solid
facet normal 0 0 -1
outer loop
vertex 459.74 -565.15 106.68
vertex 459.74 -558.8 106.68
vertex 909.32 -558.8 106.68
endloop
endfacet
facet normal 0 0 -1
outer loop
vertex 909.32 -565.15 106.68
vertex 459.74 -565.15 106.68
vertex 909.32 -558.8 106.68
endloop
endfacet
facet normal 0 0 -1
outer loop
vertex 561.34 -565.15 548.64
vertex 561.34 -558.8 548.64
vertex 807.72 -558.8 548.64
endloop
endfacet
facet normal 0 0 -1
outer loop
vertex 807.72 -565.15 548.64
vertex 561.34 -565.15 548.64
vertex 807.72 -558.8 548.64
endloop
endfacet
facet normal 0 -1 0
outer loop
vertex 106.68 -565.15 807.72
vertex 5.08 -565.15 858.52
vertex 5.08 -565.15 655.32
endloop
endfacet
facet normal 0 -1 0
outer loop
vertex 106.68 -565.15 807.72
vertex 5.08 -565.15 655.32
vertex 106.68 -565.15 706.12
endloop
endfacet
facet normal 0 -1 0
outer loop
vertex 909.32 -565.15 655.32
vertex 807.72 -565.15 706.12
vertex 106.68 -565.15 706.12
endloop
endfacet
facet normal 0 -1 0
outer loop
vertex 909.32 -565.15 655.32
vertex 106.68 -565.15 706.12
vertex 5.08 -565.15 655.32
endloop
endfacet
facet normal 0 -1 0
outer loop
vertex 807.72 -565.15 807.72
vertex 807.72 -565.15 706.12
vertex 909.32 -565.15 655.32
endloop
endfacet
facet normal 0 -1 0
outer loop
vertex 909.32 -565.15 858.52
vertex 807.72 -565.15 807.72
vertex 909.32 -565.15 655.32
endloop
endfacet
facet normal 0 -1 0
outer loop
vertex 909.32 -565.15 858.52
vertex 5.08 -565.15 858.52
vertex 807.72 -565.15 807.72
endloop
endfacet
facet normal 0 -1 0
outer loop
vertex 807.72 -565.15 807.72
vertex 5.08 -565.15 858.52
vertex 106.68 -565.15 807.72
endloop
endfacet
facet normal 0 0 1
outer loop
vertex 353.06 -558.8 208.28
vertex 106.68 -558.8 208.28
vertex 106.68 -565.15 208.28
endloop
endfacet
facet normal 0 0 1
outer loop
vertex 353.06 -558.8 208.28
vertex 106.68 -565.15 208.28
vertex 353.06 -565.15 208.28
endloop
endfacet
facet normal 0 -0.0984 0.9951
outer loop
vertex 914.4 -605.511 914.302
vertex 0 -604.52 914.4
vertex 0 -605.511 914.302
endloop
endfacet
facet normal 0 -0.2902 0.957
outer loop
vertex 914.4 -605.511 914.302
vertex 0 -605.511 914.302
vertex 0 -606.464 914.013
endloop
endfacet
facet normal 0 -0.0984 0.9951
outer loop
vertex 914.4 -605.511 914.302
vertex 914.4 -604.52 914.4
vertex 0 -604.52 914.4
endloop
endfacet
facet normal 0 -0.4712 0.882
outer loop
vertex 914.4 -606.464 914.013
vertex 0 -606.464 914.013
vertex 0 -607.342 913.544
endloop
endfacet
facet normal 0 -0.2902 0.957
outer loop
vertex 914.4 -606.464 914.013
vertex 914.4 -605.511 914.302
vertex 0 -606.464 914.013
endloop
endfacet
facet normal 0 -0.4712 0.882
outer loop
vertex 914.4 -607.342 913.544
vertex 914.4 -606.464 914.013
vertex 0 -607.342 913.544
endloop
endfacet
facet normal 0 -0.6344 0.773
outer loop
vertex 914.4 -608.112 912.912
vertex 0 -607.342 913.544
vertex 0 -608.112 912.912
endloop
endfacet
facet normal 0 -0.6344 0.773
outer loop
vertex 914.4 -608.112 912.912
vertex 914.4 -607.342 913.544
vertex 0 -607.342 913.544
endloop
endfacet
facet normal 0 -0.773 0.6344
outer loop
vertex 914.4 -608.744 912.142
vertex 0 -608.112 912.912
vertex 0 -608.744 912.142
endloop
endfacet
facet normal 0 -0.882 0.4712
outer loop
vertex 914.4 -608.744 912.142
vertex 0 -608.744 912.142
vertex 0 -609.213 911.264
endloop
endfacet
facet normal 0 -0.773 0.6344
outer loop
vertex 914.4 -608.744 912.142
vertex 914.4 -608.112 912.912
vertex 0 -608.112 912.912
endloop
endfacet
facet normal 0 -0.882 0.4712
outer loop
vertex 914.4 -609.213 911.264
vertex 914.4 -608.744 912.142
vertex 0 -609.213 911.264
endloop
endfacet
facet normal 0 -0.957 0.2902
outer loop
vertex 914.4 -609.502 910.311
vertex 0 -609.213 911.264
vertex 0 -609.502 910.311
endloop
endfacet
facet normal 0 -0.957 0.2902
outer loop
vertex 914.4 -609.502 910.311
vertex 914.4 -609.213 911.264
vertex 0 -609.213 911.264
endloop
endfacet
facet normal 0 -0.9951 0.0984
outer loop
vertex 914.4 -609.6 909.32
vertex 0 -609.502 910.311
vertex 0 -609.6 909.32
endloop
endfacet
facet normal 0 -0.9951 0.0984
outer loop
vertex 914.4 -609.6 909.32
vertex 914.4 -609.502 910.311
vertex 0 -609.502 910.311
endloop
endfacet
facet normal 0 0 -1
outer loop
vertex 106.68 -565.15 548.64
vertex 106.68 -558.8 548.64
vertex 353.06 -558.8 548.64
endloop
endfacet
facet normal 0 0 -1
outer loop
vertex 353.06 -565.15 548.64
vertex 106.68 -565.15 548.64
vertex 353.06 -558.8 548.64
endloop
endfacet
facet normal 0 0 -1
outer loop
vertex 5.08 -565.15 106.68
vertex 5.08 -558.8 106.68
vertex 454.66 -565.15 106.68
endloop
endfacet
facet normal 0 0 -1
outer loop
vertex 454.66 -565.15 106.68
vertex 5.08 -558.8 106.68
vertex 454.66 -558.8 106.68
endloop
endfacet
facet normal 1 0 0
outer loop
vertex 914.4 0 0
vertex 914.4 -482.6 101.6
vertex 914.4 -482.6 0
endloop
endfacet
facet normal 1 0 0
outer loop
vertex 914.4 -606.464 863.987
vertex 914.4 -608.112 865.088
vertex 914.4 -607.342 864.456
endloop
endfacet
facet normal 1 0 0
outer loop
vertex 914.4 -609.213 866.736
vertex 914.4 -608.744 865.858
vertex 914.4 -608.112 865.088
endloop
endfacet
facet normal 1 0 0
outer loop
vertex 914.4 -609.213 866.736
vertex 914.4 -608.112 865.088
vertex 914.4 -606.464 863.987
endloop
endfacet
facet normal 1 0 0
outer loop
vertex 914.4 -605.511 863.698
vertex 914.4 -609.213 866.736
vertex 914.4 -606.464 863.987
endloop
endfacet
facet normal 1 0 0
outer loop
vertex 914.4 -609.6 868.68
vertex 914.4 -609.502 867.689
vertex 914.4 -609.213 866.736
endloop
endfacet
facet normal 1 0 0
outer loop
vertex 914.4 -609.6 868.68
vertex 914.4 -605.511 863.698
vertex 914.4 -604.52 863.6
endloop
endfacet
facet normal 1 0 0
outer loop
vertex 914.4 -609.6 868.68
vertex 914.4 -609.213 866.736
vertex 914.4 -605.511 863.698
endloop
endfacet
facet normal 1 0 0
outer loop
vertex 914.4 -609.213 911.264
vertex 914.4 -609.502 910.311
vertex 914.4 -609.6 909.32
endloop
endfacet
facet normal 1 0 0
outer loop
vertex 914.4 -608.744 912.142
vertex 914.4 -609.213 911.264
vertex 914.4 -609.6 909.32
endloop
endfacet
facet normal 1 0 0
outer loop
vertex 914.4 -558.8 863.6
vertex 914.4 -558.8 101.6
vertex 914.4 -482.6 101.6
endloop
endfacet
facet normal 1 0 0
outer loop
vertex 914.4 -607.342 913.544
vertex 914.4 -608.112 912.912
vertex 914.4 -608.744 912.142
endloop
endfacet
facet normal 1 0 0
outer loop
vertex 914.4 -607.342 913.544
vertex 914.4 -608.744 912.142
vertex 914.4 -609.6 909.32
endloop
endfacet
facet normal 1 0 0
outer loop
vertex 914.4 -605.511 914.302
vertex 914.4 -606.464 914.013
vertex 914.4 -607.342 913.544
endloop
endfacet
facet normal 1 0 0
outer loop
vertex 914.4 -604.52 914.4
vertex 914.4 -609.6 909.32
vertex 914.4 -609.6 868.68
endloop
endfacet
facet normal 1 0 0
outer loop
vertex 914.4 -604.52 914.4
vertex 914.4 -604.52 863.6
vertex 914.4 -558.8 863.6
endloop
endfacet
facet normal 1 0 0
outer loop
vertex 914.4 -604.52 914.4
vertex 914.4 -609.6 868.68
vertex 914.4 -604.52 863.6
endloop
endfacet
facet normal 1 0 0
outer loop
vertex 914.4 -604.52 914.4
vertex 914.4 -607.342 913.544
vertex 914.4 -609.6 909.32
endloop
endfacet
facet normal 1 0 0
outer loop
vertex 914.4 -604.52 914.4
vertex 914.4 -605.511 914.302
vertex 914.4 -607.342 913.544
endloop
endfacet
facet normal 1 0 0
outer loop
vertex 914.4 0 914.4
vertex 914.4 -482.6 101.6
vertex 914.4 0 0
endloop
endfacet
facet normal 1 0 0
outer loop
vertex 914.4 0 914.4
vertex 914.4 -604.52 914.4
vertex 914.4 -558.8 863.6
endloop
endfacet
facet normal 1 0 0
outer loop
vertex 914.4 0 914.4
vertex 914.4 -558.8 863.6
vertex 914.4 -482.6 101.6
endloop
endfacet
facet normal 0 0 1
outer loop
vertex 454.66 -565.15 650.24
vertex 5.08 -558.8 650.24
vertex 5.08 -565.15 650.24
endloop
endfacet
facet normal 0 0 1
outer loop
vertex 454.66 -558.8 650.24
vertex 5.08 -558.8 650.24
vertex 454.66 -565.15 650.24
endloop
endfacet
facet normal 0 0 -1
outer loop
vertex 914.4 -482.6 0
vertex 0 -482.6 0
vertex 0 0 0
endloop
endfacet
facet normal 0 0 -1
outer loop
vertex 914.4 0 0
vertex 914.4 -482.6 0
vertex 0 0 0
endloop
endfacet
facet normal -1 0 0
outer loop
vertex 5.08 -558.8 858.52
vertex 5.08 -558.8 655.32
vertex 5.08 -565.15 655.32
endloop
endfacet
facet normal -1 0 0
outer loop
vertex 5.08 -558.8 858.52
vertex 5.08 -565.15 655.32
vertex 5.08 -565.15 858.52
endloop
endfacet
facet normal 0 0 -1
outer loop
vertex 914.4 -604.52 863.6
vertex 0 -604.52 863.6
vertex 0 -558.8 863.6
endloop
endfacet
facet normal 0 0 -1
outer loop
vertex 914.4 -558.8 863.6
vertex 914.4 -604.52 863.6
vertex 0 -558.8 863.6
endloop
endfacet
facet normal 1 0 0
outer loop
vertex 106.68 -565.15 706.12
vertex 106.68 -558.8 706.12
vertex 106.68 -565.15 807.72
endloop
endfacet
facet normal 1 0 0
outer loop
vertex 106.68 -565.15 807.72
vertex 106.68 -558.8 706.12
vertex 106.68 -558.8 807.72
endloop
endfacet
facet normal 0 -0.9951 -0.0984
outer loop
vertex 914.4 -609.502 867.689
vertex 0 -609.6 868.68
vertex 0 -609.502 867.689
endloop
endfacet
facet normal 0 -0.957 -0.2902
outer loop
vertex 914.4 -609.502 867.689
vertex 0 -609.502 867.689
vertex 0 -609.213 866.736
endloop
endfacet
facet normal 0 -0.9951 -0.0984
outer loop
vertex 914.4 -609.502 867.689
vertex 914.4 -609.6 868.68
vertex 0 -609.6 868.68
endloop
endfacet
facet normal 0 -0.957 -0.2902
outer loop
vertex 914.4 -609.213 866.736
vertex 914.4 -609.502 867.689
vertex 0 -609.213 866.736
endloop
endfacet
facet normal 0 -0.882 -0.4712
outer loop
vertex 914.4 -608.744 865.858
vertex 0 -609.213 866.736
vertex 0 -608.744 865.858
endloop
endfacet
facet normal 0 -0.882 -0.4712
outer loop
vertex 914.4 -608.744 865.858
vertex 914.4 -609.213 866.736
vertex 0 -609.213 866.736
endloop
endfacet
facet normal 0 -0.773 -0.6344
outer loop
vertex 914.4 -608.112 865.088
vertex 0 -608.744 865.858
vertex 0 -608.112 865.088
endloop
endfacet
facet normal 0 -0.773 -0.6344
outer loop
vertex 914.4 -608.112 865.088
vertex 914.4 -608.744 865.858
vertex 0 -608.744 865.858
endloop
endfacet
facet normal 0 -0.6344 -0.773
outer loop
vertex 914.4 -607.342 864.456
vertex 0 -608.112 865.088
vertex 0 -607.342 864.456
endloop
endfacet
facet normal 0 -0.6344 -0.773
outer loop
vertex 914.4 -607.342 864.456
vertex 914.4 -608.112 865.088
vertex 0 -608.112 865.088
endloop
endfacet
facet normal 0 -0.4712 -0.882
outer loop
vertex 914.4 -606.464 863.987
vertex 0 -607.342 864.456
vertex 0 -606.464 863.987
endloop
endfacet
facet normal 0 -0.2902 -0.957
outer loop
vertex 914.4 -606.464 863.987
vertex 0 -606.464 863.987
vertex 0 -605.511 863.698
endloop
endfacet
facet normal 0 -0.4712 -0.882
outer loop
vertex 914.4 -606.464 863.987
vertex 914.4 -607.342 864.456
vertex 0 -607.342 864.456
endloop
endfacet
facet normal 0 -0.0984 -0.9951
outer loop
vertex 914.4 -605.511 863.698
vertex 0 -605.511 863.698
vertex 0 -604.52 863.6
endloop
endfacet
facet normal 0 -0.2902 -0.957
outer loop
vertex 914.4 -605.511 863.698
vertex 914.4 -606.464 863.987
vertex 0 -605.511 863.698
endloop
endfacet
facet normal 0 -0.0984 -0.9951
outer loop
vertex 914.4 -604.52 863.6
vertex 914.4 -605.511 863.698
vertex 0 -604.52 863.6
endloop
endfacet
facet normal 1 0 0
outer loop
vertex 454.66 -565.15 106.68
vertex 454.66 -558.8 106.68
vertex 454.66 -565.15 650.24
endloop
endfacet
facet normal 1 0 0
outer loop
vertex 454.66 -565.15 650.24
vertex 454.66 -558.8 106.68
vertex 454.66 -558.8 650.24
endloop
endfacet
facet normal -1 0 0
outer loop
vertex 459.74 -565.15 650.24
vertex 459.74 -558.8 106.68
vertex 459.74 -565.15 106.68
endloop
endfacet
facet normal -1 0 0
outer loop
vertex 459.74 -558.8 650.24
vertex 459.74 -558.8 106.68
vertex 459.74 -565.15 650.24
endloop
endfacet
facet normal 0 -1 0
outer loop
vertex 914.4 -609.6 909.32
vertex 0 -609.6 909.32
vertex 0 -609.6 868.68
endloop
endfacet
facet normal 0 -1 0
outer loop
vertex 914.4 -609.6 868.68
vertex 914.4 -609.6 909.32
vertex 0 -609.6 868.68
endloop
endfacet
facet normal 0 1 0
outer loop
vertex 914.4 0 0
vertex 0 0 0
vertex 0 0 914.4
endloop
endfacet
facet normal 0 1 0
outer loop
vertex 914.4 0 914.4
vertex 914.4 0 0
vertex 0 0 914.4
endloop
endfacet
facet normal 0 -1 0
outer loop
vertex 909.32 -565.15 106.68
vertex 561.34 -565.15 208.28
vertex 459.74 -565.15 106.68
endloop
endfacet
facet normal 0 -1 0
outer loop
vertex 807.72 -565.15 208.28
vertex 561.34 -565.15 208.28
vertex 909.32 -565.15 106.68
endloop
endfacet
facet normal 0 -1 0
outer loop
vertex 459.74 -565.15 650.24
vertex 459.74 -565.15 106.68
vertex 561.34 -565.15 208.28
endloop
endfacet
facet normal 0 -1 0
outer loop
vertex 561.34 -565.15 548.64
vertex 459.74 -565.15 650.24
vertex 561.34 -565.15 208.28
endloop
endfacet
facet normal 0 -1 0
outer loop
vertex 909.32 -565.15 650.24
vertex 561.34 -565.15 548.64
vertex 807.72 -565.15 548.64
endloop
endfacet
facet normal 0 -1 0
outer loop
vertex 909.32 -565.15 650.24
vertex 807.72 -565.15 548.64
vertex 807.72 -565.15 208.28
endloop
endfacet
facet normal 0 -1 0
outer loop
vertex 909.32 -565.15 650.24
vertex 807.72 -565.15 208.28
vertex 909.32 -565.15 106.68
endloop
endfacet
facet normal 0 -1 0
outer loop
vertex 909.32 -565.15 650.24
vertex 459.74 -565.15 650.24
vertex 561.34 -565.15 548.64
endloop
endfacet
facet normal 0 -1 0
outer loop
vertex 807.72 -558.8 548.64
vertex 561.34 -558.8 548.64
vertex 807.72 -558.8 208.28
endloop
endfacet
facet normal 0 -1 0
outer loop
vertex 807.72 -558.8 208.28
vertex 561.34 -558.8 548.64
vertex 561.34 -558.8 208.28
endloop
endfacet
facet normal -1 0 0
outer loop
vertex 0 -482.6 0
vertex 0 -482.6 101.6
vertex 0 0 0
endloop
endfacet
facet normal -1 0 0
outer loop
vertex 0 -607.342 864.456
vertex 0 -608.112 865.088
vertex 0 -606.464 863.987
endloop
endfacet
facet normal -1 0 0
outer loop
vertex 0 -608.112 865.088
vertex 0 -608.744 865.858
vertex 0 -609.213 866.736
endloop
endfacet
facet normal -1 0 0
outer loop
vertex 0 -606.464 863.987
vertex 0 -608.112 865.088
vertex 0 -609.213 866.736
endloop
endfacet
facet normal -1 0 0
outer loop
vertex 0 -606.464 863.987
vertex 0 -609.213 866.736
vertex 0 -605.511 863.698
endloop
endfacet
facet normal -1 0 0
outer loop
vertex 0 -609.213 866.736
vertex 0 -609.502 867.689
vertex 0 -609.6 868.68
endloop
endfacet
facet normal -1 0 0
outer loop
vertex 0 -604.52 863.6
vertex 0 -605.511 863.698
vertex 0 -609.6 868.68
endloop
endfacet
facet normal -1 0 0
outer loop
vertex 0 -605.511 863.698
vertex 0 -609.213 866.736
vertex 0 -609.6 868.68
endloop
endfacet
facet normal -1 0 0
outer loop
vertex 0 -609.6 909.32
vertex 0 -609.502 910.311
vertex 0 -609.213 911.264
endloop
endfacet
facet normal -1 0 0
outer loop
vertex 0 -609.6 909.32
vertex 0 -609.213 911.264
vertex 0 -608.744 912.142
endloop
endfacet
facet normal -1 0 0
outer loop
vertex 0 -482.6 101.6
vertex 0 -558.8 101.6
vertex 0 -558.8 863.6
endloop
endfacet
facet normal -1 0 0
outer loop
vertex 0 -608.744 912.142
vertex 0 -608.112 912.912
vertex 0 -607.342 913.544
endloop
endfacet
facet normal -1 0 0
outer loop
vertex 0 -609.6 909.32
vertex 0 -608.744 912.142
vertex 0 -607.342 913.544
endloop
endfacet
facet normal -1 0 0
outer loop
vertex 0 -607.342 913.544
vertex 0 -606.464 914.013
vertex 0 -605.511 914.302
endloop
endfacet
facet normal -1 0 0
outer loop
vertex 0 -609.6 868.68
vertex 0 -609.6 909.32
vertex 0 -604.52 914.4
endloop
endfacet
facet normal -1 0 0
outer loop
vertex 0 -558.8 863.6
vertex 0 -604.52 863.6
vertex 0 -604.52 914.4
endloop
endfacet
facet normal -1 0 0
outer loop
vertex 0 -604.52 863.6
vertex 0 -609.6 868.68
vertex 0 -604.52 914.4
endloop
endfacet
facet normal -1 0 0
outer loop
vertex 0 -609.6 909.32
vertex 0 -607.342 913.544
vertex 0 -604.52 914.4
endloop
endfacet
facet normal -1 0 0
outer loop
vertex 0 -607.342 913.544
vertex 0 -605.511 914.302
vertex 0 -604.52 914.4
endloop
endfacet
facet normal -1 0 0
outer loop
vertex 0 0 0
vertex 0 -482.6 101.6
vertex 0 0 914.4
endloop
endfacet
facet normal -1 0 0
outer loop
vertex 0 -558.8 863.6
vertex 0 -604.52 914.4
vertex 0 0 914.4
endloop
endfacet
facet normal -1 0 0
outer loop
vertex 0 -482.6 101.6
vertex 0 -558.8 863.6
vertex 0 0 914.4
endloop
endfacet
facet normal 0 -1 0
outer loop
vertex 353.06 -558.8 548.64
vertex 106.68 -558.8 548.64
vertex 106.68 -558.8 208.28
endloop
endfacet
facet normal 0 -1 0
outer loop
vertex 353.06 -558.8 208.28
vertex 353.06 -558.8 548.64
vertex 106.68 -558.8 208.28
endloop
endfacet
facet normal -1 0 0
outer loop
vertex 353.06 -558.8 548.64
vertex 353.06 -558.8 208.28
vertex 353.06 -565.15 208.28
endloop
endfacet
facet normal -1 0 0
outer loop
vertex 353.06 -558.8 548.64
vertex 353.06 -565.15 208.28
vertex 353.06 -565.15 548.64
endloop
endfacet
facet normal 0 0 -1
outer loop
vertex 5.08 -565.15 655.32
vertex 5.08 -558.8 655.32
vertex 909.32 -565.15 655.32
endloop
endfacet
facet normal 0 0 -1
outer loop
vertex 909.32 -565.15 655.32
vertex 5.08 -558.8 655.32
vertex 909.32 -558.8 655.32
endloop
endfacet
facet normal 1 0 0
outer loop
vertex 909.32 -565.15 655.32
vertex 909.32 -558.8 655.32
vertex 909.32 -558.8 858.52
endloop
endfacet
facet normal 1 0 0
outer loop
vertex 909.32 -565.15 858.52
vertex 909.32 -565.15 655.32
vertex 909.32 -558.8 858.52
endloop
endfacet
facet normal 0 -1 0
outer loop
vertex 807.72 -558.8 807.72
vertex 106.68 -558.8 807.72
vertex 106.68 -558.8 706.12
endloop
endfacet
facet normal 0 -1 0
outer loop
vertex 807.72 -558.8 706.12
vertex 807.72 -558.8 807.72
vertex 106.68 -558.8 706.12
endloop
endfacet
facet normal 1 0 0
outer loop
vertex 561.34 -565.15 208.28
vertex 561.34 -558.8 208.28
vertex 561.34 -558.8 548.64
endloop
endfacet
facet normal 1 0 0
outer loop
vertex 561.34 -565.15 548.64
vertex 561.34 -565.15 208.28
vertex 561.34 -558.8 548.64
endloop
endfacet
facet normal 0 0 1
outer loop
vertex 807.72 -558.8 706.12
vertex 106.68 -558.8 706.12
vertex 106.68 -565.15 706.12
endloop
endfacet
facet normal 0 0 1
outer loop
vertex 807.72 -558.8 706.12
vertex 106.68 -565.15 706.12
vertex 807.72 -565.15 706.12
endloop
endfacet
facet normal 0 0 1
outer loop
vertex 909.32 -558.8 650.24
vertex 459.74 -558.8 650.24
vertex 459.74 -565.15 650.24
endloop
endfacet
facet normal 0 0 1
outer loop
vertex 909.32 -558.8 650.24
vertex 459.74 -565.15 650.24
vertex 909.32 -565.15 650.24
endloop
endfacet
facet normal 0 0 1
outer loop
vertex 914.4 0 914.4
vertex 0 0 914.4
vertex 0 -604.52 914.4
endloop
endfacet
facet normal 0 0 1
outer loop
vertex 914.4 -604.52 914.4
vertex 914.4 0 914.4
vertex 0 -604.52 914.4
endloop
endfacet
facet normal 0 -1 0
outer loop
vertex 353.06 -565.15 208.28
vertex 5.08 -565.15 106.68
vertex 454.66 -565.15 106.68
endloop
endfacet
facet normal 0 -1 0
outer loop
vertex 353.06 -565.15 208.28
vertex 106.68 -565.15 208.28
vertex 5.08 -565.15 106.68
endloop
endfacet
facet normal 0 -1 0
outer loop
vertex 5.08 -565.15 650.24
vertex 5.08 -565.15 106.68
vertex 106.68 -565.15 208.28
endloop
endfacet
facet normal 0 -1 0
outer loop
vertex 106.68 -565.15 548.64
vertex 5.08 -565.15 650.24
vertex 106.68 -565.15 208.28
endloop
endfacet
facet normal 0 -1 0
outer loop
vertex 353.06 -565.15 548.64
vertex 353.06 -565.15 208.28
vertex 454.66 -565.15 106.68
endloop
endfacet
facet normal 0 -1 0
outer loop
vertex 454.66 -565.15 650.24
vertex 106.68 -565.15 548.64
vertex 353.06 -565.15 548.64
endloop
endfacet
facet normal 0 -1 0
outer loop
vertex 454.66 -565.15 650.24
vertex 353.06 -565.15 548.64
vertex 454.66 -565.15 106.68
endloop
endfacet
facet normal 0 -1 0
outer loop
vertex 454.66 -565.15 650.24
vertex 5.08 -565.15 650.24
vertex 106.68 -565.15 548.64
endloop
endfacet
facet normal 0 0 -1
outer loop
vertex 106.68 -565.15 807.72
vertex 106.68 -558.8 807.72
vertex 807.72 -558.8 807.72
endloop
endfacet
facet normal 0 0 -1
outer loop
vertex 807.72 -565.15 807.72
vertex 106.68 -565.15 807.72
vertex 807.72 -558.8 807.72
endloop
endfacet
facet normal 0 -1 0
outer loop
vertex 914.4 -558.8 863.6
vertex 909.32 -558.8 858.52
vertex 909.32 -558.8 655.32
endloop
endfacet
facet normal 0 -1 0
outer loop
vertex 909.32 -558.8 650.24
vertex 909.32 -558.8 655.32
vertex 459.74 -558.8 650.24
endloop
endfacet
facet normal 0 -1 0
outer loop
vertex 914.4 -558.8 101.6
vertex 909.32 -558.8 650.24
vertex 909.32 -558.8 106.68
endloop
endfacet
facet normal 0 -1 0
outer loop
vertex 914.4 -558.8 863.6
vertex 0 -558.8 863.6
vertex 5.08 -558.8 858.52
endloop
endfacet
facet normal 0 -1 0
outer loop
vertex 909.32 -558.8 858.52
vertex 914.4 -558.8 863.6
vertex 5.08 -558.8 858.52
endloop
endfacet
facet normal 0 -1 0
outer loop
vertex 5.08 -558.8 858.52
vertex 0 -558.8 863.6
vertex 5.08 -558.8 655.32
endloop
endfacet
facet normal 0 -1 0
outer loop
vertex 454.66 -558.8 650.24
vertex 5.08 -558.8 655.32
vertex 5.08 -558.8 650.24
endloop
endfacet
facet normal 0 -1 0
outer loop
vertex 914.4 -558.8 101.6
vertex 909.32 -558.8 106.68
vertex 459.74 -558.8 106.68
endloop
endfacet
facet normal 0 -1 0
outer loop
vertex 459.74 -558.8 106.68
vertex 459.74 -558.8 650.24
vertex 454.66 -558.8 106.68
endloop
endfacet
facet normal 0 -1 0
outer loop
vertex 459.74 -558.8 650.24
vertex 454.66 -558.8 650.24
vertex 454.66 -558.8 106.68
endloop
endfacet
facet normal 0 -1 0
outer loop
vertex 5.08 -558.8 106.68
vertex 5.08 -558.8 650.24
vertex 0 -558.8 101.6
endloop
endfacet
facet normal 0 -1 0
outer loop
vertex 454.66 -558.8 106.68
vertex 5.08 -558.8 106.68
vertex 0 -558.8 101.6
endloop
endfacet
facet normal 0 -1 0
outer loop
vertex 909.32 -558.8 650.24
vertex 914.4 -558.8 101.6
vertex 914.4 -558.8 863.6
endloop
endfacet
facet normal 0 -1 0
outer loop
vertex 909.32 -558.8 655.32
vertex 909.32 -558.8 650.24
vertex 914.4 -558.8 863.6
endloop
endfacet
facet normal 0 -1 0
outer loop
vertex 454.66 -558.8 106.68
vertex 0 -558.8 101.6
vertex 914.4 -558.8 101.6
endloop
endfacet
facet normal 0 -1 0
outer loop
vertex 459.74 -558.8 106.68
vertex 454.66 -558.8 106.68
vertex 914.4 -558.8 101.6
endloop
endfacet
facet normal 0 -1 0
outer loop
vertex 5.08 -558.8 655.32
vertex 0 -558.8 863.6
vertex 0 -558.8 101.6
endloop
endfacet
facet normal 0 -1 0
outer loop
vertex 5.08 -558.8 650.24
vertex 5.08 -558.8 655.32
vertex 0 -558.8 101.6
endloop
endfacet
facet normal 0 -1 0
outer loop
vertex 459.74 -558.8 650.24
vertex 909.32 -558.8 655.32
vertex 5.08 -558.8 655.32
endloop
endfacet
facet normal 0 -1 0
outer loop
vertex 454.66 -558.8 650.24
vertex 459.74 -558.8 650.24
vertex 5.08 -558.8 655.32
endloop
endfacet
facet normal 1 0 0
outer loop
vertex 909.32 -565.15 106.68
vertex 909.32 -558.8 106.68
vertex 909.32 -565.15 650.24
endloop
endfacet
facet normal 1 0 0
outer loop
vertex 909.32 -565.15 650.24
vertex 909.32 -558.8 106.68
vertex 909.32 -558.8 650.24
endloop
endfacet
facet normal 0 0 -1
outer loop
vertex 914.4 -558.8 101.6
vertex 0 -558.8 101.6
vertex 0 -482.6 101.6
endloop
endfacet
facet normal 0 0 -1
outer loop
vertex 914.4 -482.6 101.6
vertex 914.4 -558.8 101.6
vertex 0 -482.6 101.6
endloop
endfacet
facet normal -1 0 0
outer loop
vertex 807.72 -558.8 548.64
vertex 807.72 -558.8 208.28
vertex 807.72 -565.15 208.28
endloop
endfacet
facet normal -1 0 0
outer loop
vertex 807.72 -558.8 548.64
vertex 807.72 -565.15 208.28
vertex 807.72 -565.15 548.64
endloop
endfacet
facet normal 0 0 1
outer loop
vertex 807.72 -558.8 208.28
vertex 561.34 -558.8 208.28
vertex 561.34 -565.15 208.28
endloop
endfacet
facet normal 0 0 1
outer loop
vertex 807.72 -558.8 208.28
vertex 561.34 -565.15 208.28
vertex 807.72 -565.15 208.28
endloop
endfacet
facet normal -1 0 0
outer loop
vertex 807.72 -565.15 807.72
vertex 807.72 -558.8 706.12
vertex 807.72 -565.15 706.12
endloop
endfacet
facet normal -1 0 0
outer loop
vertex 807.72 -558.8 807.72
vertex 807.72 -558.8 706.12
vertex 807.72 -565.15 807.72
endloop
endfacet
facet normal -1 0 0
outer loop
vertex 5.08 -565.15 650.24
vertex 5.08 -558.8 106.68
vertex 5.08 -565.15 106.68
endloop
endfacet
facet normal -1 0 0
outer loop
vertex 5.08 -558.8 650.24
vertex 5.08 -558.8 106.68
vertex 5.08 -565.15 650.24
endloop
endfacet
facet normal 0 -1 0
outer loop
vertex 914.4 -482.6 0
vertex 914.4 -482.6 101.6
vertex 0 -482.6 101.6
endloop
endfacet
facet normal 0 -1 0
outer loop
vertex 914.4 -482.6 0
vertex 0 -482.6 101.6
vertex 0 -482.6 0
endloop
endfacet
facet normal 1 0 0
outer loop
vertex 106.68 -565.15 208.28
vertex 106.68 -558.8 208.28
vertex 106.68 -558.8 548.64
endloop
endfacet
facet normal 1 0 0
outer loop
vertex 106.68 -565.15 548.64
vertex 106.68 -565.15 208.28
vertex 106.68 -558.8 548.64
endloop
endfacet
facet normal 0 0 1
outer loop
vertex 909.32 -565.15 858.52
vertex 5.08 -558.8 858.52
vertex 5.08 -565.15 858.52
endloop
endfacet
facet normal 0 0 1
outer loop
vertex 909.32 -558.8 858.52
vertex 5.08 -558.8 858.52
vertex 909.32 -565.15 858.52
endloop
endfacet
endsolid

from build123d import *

# Parameters (mm, degrees)
F1_DEPTH = 914.4
F2_R     = 5.08
F3_W     = 904.24
F3_H     = 203.2
F3_W_2   = 701.04
F3_H_2   = 101.6
F3_W_3   = 449.58
F3_H_3   = 543.56
F3_W_4   = 246.38
F3_H_4   = 340.36
F4_DEPTH = 6.35


with BuildPart() as f1:
    # F0 (on Right) → F1 (new body)
    with BuildSketch(Plane.YZ):
        Polygon((-482.6, 0), (0, 0), (0, 914.4), (-609.6, 914.4), (-609.6, 863.6), (-558.8, 863.6), (-558.8, 101.6), (-482.6, 101.6), align=None)
    extrude(amount=F1_DEPTH)

    # F2
    f2_edges = [f1.edges().sort_by_distance(p)[0] for p in [
        (457.2, -609.6, 914.4),
        (457.2, -609.6, 863.6),
    ]]
    fillet(f2_edges, radius=F2_R)

    # F3 (on face) → F4 (join)
    with BuildSketch(Plane.XZ.offset(558.8)):
        with Locations((457.2, 756.92)):
            Rectangle(F3_W, F3_H)
        with Locations((457.2, 756.92)):
            Rectangle(F3_W_2, F3_H_2, mode=Mode.SUBTRACT)
        with Locations((684.53, 378.46)):
            Rectangle(F3_W_3, F3_H_3)
        with Locations((684.53, 378.46)):
            Rectangle(F3_W_4, F3_H_4, mode=Mode.SUBTRACT)
        with Locations((229.87, 378.46)):
            Rectangle(F3_W_3, F3_H_3)
        with Locations((229.87, 378.46)):
            Rectangle(F3_W_4, F3_H_4, mode=Mode.SUBTRACT)
    extrude(amount=F4_DEPTH)


solid = f1.part
